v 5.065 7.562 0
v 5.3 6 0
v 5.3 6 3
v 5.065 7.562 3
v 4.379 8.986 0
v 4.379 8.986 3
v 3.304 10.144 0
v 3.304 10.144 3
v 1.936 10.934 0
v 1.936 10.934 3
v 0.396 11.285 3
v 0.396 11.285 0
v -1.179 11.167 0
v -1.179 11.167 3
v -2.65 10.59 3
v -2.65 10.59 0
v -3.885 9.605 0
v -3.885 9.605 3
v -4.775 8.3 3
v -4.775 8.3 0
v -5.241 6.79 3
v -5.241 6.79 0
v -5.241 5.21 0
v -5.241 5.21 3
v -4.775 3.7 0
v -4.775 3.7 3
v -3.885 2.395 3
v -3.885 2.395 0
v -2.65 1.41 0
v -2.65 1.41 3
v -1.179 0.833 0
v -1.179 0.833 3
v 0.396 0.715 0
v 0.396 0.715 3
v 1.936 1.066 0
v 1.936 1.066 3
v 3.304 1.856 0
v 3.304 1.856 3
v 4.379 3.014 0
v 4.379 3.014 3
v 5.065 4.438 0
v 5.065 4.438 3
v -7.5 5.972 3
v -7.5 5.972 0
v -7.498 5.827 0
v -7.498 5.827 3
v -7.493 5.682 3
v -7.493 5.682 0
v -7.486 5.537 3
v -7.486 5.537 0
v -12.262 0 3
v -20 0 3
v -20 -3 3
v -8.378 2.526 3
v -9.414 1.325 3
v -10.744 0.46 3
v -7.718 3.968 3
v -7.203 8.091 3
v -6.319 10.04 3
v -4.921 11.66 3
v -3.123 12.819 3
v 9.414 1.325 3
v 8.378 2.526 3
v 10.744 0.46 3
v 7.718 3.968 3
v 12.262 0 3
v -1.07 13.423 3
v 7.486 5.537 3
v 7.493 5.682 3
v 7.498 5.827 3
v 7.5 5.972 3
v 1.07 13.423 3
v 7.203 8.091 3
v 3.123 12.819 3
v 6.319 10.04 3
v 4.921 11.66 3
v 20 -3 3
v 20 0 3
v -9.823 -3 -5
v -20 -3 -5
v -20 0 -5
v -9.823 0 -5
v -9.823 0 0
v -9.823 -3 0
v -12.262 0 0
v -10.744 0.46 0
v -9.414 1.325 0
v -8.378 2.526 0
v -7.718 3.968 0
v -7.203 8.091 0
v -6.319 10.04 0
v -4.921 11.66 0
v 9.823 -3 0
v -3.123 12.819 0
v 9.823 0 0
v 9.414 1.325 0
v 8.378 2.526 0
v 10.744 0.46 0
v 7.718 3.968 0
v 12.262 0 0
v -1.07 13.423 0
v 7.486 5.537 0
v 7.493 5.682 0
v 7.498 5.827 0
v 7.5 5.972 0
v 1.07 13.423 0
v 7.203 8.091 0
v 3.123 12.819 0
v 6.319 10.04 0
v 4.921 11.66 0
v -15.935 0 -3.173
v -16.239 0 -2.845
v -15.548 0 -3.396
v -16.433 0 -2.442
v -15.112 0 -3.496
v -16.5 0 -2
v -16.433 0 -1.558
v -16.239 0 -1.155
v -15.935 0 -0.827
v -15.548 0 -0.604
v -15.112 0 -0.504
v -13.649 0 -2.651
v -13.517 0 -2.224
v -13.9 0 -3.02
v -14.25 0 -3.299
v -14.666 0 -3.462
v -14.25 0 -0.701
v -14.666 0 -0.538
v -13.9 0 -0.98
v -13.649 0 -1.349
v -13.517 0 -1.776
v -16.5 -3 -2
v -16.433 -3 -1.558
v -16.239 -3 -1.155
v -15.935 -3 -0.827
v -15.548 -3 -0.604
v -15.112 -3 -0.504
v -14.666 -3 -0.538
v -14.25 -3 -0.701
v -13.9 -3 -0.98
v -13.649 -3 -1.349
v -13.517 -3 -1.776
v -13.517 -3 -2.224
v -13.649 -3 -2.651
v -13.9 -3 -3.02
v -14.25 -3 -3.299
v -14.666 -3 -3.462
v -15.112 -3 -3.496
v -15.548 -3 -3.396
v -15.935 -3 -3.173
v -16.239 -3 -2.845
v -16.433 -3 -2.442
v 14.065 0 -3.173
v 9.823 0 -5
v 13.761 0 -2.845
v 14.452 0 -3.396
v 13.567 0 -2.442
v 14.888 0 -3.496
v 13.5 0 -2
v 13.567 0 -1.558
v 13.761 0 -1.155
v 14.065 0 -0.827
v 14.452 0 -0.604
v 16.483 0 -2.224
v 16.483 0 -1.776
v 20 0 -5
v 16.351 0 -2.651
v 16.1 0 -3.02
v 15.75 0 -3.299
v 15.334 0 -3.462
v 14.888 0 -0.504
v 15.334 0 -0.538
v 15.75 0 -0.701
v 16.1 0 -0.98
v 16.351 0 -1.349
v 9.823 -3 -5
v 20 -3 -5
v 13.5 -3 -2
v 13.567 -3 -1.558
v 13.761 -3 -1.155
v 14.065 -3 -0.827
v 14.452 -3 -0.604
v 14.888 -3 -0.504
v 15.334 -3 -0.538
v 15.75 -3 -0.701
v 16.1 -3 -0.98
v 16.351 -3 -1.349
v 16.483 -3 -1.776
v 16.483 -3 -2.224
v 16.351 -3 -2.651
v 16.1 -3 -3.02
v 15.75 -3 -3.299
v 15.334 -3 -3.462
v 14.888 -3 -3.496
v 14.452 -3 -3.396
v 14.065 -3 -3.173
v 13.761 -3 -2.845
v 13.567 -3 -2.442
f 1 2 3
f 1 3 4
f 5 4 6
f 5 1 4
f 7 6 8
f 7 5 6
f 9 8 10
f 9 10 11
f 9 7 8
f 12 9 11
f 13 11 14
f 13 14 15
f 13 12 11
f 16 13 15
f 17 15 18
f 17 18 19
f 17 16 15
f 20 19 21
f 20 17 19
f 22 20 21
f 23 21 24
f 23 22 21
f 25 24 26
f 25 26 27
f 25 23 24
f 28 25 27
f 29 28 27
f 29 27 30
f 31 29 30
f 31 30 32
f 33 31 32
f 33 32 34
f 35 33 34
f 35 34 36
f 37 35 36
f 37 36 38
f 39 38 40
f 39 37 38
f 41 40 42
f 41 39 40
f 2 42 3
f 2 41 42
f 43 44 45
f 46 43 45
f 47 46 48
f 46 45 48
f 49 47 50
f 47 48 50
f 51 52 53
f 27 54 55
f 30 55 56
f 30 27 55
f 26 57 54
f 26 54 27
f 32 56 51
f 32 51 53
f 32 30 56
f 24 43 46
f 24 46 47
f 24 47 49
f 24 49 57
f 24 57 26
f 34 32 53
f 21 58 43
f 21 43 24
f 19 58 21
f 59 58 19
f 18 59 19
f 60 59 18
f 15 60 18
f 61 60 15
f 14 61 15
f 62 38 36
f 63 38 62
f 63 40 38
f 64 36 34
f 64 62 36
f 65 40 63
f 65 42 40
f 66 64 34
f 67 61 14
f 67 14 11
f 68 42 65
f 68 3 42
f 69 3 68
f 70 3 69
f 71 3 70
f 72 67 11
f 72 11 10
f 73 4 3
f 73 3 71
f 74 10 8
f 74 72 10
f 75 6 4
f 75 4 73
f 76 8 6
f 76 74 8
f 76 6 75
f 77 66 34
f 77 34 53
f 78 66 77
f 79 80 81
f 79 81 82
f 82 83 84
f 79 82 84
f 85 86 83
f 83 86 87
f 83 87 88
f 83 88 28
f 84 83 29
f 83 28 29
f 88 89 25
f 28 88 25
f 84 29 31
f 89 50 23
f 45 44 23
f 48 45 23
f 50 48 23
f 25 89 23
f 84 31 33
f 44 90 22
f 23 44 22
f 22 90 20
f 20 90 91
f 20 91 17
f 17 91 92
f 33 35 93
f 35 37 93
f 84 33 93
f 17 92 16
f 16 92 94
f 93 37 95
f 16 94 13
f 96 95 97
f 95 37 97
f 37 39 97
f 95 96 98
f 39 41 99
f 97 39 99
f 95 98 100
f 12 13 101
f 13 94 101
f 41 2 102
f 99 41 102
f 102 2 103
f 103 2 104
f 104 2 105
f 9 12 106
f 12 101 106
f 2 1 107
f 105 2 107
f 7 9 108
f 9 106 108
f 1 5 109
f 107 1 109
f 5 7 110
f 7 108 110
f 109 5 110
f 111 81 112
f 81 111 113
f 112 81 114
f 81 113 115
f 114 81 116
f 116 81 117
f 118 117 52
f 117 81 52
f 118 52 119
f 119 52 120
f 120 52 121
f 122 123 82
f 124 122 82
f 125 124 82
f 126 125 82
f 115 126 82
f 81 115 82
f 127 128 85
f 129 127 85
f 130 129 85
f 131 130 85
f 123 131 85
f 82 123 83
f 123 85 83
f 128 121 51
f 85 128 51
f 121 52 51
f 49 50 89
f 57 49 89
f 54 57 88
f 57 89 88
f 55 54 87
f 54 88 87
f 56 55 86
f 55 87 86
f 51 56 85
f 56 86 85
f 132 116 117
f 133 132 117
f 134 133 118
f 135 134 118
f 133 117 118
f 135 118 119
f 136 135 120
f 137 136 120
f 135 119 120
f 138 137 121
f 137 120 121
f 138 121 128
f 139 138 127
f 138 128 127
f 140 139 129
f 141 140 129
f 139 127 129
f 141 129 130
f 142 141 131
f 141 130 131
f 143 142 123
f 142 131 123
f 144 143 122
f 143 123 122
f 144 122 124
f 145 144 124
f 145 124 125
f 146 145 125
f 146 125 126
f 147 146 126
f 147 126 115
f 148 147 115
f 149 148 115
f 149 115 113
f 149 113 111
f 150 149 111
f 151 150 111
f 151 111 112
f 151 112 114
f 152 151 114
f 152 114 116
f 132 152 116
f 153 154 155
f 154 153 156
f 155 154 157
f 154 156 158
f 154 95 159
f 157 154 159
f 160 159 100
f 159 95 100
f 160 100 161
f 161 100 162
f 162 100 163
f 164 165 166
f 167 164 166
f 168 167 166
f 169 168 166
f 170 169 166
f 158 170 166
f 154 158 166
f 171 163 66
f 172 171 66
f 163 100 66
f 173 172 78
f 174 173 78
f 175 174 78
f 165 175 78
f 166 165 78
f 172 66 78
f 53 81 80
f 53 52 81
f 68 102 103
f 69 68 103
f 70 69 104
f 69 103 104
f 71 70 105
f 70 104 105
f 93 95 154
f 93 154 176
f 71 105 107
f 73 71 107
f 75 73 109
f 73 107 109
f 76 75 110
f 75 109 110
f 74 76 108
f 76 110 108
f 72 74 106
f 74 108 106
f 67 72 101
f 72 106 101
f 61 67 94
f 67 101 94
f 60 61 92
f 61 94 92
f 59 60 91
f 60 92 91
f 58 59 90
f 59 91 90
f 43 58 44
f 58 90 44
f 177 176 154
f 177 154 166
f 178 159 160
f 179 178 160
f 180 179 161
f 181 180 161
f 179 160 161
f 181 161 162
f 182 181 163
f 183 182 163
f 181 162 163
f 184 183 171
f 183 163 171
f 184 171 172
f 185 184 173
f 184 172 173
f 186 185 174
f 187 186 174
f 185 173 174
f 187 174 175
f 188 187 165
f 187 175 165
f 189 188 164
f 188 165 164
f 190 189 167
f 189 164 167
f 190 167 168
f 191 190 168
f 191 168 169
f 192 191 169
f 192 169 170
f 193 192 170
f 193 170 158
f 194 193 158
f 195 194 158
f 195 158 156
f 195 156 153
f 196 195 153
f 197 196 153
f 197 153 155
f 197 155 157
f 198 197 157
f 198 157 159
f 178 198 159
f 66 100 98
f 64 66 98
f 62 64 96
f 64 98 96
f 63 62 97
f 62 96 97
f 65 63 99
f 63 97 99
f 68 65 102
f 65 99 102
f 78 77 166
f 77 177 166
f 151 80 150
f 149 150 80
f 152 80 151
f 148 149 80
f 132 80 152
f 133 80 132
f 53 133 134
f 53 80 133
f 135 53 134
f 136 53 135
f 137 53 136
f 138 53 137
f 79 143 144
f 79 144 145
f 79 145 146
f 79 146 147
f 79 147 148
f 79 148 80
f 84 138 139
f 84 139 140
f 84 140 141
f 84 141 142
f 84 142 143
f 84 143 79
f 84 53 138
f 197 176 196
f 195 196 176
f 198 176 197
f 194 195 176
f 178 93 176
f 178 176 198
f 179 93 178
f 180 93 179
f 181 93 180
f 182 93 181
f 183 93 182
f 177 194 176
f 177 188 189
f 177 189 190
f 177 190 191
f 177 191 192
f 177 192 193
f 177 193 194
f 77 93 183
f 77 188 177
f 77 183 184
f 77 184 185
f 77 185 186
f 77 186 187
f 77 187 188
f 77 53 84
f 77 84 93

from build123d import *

# Parameters (mm, degrees)
F0_R     = 5.3
F1_DEPTH = 3
F2_W     = 10.177304
F2_H     = 3
F3_DEPTH = 5
F4_R     = 1.5
F5_DEPTH = 5


with BuildPart() as f1:
    # F0 (on Top) → F1 (new body)
    with BuildSketch(Plane.XY):
        with BuildLine():
            Line((-12.261554, 0), (-20, 0))
            Line((-20, 0), (-20, -3))
            Line((-20, -3), (0, -3))
            Line((0, -3), (20, -3))
            Line((20, -3), (20, 0))
            Line((20, 0), (12.261554, 0))
            ThreePointArc((12.261554, 0), (8.853776, 1.888736), (7.485685, 5.536832))
            ThreePointArc((7.485685, 5.536832), (7.488618, 5.754393), (7.499947, 5.971679))
            ThreePointArc((7.499947, 5.971679), (0, 13.5), (-7.499947, 5.971679))
            ThreePointArc((-7.499947, 5.971679), (-7.488618, 5.754393), (-7.485685, 5.536832))
            ThreePointArc((-7.485685, 5.536832), (-8.853776, 1.888736), (-12.261554, 0))
        make_face()
        with Locations((0, 6)):
            Circle(F0_R, mode=Mode.SUBTRACT)
        with BuildLine():
            ThreePointArc((-7.499947, 5.971679), (-7.495969, 5.754152), (-7.485685, 5.536832))
            ThreePointArc((-7.485685, 5.536832), (-7.488618, 5.754393), (-7.499947, 5.971679))
        make_face()
        with BuildLine():
            ThreePointArc((7.485685, 5.536832), (7.495969, 5.754152), (7.499947, 5.971679))
            ThreePointArc((7.499947, 5.971679), (7.488618, 5.754393), (7.485685, 5.536832))
        make_face()
    extrude(amount=F1_DEPTH)

    # F2 (on face) → F3 (join)
    with BuildSketch(Plane(origin=(0, 0, 0), x_dir=(1, 0, 0), z_dir=(0, 0, -1))):
        with Locations((-14.911348, 1.5)):
            Rectangle(F2_W, F2_H)
        with Locations((14.911348, 1.5)):
            Rectangle(F2_W, F2_H)
    extrude(amount=F3_DEPTH)

    # F4 (on face) → F5 (cut)
    with BuildSketch(Plane(origin=(0, 0, 0), x_dir=(-1, 0, 0), z_dir=(0, 1, 0))):
        with Locations((-15, -2)):
            Circle(F4_R)
        with Locations((15, -2)):
            Circle(F4_R)
    extrude(amount=-F5_DEPTH, mode=Mode.SUBTRACT)


solid = f1.part
